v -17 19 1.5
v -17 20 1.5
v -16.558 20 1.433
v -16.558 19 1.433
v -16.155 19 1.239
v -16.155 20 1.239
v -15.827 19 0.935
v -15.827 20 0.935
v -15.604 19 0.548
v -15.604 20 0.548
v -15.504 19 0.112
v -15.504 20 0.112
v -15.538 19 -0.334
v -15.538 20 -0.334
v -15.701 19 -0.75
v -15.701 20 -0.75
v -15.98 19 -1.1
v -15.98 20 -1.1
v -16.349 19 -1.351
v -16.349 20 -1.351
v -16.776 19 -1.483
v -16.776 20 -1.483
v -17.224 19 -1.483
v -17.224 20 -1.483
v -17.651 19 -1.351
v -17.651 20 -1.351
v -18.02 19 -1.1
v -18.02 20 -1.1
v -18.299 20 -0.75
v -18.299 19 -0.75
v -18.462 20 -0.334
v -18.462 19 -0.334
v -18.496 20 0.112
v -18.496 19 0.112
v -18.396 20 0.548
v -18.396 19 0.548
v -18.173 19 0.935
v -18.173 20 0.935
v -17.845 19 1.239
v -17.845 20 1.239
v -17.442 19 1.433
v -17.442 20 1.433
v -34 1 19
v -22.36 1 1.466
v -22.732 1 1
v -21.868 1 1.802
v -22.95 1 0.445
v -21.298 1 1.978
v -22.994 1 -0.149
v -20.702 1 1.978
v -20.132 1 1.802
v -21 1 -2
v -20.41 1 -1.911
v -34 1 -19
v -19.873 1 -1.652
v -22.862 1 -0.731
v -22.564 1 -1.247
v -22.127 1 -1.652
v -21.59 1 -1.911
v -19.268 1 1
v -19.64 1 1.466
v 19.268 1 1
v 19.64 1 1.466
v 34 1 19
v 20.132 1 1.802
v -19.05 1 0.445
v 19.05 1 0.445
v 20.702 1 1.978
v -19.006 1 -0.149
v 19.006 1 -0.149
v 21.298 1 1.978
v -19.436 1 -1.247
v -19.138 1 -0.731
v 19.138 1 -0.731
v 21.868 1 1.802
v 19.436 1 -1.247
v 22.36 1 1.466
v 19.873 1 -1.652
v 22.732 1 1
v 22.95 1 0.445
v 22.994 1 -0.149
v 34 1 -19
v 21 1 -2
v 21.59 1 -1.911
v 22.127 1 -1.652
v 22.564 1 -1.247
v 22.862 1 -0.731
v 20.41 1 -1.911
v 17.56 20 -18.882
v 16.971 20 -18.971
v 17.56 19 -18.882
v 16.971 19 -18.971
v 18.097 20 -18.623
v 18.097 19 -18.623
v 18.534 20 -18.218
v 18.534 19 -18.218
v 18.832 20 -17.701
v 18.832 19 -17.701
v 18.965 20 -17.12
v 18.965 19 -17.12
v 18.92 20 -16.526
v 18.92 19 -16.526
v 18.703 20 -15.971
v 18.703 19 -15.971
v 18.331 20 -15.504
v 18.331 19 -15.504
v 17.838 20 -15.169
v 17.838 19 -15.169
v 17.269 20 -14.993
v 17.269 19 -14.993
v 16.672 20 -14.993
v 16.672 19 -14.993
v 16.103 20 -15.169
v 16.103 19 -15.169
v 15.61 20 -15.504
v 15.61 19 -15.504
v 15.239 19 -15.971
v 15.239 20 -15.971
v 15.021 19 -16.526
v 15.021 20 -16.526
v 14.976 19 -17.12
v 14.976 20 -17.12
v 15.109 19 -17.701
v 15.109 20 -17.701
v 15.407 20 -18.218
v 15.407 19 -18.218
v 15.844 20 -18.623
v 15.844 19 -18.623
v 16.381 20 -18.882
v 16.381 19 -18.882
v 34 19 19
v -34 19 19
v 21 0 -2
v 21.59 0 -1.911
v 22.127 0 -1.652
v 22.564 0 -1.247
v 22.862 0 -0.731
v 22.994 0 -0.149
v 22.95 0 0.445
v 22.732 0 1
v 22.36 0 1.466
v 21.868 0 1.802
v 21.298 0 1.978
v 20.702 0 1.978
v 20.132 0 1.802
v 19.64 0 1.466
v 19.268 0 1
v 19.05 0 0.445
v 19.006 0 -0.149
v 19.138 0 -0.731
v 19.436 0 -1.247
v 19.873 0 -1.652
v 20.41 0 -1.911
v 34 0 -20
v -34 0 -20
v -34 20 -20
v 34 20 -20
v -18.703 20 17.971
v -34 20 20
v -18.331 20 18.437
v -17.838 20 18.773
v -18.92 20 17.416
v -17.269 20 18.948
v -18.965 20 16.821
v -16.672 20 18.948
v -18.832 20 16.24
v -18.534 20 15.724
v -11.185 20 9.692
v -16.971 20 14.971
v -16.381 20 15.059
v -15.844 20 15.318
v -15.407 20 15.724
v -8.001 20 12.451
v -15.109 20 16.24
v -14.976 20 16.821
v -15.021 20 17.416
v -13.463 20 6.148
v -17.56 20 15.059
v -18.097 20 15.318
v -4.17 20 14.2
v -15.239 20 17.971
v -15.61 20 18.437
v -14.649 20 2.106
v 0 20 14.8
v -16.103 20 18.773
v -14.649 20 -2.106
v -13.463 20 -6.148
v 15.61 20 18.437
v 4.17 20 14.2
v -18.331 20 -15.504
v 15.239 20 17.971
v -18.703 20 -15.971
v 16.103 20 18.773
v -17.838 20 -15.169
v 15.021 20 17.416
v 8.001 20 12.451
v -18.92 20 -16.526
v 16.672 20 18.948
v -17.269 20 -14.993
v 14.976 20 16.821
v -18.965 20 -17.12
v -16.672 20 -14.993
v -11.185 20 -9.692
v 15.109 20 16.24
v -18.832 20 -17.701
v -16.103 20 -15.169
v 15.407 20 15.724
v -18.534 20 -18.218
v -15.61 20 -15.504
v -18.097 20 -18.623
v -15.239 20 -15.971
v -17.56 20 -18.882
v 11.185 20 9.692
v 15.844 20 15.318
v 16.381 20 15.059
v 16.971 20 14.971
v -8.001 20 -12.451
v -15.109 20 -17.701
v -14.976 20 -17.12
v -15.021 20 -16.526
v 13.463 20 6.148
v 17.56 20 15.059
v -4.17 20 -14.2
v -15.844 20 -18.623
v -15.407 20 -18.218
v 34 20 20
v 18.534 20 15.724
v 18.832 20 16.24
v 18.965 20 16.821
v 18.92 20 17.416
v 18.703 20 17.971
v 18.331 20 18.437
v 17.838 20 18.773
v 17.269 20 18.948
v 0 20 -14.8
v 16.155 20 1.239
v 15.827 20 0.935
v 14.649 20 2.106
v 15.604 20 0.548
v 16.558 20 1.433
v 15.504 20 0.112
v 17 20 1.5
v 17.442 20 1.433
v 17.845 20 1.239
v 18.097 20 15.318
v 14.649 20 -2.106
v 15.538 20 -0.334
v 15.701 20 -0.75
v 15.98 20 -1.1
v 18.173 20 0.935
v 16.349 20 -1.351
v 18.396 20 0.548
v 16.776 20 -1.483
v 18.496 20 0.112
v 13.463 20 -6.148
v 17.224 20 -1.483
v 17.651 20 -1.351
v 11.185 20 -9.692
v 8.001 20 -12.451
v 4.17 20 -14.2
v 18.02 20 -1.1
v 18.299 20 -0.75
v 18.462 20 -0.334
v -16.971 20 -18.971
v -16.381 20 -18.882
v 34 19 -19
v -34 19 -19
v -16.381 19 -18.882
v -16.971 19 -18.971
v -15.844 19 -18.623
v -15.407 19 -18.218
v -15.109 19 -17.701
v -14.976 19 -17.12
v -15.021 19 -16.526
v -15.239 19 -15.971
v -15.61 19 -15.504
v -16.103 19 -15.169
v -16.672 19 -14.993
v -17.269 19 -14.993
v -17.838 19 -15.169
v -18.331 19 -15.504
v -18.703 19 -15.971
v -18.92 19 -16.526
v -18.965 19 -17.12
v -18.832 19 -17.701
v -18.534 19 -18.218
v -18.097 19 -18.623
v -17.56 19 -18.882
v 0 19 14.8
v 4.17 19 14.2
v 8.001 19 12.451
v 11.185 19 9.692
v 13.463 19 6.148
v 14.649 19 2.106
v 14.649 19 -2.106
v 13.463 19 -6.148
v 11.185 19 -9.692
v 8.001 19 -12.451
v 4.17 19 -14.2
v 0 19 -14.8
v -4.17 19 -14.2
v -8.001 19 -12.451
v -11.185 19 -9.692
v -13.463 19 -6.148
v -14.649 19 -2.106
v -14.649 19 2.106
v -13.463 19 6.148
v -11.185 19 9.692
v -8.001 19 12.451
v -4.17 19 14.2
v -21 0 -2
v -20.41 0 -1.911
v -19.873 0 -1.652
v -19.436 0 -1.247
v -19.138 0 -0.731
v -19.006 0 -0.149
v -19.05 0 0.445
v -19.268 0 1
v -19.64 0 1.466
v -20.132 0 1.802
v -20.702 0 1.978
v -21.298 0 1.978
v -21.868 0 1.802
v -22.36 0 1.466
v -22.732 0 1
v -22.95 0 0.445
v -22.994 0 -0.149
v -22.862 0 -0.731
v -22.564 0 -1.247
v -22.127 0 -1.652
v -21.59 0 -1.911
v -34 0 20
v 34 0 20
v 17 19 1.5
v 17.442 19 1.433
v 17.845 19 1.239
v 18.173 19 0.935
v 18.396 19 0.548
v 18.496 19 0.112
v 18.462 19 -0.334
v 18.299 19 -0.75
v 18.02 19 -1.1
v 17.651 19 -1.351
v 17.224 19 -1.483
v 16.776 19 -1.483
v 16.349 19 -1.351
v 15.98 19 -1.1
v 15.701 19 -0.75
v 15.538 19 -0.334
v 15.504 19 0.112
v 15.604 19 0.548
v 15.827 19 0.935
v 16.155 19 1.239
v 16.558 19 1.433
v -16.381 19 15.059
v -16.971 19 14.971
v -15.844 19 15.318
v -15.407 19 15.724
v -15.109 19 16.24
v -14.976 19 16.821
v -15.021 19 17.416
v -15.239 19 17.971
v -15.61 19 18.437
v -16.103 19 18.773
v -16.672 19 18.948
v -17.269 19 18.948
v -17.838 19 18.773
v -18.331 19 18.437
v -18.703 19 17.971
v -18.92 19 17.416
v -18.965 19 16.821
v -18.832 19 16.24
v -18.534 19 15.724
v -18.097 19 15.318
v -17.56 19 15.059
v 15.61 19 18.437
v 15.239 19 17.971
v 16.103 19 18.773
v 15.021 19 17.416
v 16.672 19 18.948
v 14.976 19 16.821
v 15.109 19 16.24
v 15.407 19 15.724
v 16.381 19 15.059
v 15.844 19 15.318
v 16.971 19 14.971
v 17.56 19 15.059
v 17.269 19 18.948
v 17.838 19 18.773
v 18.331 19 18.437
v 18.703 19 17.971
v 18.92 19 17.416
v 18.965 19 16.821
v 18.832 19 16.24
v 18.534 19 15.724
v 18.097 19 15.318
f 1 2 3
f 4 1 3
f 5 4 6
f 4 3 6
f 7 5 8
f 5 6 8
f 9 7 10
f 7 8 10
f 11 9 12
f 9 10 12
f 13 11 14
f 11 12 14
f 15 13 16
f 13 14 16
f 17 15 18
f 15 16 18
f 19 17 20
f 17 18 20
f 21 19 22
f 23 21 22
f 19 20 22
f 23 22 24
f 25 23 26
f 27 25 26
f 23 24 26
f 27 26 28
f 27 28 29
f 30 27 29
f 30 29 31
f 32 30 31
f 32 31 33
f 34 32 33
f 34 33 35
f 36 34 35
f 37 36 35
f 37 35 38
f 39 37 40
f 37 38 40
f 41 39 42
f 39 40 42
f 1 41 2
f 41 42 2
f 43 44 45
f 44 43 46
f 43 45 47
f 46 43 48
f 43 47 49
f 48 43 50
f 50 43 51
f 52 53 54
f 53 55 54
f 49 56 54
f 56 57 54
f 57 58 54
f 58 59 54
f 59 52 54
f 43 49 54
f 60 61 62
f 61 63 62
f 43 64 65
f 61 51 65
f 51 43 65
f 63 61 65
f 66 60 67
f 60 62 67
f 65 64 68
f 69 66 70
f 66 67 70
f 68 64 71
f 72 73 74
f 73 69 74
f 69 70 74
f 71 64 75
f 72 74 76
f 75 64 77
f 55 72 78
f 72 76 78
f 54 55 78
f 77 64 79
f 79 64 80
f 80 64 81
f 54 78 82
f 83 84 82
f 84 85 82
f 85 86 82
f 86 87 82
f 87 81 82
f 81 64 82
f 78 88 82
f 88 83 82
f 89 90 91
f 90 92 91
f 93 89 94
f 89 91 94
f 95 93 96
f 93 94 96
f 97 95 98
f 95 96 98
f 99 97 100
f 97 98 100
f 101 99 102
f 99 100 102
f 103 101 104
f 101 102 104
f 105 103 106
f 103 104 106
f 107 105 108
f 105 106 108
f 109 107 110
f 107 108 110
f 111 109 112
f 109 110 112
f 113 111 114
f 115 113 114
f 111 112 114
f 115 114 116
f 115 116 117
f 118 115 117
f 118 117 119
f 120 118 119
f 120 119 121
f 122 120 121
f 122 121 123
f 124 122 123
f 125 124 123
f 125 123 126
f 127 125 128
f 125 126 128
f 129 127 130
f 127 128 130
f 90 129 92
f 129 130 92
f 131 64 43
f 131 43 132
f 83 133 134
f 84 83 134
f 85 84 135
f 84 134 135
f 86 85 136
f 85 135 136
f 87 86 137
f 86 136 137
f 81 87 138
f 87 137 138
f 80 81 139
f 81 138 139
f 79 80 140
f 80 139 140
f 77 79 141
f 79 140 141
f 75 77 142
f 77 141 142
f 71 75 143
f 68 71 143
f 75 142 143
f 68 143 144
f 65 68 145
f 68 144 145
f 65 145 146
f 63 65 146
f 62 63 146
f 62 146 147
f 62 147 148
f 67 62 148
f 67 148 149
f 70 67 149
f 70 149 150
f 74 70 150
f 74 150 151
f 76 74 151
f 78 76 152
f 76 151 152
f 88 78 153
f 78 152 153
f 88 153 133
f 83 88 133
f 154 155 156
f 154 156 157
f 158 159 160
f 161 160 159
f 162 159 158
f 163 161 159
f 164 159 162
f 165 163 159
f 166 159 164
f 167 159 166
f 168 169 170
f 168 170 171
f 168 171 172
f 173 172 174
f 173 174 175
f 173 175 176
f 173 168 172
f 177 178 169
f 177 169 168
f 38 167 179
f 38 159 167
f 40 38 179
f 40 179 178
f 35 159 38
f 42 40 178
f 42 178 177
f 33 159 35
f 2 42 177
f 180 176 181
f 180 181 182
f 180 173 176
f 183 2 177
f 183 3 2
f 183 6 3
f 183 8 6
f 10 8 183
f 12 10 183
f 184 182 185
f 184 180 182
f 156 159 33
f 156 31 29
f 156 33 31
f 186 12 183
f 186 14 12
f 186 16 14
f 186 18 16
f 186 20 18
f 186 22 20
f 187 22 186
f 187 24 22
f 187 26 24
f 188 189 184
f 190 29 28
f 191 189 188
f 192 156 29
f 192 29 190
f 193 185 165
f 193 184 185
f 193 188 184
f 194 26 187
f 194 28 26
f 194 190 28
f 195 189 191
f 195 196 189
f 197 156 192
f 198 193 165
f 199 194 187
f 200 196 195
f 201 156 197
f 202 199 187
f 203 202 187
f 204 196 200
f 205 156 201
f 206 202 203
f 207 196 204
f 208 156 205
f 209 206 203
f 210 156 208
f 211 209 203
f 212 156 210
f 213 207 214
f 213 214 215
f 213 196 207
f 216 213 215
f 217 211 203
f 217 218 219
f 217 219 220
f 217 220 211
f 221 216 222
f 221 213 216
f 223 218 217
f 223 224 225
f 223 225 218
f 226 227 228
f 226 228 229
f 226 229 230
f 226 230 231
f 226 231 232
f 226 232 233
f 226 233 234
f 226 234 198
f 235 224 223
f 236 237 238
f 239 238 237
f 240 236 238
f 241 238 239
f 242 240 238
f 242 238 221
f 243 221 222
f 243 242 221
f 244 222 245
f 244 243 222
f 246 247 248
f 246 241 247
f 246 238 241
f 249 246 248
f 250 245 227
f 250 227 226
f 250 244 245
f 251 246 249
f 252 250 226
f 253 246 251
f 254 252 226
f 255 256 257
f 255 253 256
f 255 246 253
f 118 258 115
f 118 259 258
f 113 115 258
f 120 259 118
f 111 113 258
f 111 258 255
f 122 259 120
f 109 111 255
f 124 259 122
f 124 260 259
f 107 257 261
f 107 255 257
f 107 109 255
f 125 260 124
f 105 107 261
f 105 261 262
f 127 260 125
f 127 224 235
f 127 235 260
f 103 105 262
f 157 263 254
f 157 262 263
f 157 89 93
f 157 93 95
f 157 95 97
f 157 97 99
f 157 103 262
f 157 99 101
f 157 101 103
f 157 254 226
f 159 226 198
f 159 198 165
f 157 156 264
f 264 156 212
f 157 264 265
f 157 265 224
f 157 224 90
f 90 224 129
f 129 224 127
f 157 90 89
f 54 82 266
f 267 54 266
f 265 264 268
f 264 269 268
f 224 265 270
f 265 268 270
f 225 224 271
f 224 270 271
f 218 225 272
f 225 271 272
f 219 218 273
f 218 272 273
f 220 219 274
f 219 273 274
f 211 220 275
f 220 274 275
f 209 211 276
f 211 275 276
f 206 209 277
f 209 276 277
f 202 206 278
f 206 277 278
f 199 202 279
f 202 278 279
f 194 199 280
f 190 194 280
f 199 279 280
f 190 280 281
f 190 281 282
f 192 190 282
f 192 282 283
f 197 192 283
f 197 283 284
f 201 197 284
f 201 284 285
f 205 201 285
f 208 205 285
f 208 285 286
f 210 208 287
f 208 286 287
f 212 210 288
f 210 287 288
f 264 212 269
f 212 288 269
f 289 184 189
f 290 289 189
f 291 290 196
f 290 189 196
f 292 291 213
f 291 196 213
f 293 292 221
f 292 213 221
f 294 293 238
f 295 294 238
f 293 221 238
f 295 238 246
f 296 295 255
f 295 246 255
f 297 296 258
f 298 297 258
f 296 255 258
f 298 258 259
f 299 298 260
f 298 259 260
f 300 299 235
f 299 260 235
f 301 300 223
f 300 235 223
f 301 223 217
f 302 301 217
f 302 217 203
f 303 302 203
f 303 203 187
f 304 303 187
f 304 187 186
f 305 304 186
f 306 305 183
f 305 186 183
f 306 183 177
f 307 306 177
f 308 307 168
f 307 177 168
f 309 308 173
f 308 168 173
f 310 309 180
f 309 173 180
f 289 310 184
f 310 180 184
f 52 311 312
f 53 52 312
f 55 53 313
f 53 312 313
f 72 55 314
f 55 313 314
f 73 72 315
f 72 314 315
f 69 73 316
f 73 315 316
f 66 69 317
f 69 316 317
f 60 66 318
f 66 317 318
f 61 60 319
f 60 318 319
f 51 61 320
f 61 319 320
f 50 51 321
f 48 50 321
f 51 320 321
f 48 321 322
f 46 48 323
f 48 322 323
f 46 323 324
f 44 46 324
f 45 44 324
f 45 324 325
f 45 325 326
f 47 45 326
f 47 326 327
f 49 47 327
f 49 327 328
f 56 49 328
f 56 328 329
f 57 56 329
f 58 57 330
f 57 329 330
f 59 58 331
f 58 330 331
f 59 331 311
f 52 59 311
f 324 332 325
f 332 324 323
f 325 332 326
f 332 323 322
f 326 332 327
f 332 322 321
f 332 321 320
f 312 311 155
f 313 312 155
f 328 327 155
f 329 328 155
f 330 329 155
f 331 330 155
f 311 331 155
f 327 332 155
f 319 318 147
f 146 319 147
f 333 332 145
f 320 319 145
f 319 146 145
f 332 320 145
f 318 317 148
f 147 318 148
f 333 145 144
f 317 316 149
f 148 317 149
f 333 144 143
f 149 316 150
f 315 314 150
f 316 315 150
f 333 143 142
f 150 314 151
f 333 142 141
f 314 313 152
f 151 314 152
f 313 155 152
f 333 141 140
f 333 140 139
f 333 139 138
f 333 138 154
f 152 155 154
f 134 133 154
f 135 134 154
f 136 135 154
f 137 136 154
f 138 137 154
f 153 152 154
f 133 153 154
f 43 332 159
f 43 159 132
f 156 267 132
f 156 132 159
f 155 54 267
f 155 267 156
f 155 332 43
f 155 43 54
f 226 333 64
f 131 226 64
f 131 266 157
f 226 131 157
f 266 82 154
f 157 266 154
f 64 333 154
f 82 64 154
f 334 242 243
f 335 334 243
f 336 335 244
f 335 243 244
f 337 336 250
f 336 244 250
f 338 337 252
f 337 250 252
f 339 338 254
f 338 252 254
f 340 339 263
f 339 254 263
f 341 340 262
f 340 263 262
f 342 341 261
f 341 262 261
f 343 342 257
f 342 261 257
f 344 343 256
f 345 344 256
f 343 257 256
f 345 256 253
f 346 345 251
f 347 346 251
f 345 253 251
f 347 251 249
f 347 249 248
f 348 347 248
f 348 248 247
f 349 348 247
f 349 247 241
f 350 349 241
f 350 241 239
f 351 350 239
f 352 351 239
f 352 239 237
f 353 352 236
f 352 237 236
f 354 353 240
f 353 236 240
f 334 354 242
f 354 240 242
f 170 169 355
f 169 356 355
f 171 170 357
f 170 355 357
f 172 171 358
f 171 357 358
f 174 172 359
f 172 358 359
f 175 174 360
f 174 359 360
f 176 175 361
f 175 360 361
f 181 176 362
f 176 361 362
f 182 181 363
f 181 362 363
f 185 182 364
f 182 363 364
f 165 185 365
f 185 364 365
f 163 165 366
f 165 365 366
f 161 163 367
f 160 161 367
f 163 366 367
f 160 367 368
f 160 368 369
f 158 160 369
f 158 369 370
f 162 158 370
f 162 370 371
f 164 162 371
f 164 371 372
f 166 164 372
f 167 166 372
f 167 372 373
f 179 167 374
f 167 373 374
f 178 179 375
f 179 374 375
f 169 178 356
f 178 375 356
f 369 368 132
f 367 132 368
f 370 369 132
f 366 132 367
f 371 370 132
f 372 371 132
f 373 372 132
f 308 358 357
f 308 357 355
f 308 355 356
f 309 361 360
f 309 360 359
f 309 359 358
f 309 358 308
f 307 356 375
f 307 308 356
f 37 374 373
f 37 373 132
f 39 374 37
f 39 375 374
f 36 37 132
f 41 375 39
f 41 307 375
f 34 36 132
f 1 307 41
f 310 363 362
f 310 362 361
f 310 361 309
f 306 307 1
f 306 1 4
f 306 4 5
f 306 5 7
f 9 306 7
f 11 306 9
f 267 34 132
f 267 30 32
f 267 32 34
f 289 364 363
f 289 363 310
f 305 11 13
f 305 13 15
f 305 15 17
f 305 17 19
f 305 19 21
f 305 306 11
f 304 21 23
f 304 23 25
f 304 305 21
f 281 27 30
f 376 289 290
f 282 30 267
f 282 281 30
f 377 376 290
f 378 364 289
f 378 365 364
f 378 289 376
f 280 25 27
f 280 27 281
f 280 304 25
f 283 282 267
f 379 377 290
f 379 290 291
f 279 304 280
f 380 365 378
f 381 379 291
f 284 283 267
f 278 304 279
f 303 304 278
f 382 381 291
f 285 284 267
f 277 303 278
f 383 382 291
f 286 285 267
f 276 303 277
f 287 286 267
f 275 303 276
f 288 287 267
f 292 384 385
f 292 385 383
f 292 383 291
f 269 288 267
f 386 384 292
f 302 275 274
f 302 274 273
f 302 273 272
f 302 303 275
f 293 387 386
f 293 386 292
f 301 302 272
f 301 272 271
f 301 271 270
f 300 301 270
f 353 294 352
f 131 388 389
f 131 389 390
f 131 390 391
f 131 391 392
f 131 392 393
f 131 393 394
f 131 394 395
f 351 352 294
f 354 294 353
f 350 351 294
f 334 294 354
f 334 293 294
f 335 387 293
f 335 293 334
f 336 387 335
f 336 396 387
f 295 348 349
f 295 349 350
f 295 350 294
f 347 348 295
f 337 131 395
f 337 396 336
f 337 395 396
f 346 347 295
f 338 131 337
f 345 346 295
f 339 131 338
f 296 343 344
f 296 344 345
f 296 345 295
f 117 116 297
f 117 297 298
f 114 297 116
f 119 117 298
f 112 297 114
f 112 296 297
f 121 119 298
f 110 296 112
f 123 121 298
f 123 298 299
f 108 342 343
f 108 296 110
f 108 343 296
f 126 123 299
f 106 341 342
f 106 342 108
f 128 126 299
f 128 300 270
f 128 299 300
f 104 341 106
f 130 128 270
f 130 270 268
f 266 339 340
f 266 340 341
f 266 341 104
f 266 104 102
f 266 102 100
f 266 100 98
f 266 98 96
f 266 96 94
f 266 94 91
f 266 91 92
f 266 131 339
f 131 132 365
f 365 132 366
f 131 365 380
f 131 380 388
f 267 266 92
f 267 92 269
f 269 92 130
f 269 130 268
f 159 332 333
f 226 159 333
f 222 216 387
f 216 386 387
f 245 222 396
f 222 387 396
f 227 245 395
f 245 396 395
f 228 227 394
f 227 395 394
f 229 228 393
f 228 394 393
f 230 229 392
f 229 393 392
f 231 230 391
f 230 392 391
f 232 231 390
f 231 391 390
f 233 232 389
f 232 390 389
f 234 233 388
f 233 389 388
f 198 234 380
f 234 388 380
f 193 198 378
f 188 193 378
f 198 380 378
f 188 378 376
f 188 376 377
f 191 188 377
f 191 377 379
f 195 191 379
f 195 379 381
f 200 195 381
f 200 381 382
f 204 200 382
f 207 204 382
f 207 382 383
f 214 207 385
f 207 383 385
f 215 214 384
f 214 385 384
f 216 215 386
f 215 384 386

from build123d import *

# Parameters (mm, degrees)
SKETCH_1_W          = 68
SKETCH_1_H          = 40
EXTRUDE_1_DEPTH     = 20
SKETCH_2_W          = 38
SKETCH_2_H          = 18
CUT_EXTRUDE_1_DEPTH = 74.647810558
SKETCH_3_R          = 2
CUT_EXTRUDE_2_DEPTH = 1
SKETCH_4_R          = 14.8
SKETCH_4_R_2        = 1.5
CUT_EXTRUDE_3_DEPTH = 1
MM_PRESS_1_D        = 4
MM_PRESS_1_DEPTH    = 1
MM_PRESS_1_TIP      = 1.201721238


with BuildPart() as part:
    # 草图1 → 凸台-拉伸1 (new body)
    with BuildSketch(Plane(origin=(0, 0, 0), x_dir=(1, 0, 0), z_dir=(0, 1, 0))):
        Rectangle(SKETCH_1_W, SKETCH_1_H)
    extrude(amount=EXTRUDE_1_DEPTH)

    # 草图2 → 切除-拉伸1 (cut, through all)
    with BuildSketch(Plane(origin=(34, 0, 0), x_dir=(0, 0, -1), z_dir=(1, 0, 0))):
        with Locations((0, 10)):
            Rectangle(SKETCH_2_W, SKETCH_2_H)
    extrude(amount=-CUT_EXTRUDE_1_DEPTH, mode=Mode.SUBTRACT)

    # 草图3 → 切除-拉伸2 (cut)
    with BuildSketch(Plane.XZ):
        with Locations(Location((-21, 0, 0), (0, 0, 270))):
            Circle(SKETCH_3_R)
        with Locations(Location((21, 0, 0), (0, 0, 270))):
            Circle(SKETCH_3_R)
    extrude(amount=-CUT_EXTRUDE_2_DEPTH, mode=Mode.SUBTRACT)

    # 草图4 → 切除-拉伸3 (cut)
    with BuildSketch(Plane(origin=(0, 20, 0), x_dir=(1, 0, 0), z_dir=(0, 1, 0))):
        with Locations(Location((0, 0, 0), (0, 0, 270))):
            Circle(SKETCH_4_R)
        with Locations(Location((-17, 0, 0), (0, 0, 270))):
            Circle(SKETCH_4_R_2)
        with Locations(Location((17, 0, 0), (0, 0, 270))):
            Circle(SKETCH_4_R_2)
    extrude(amount=-CUT_EXTRUDE_3_DEPTH, mode=Mode.SUBTRACT)

    # 大小mm Press 暗销孔1
    with Locations(Plane(origin=(16.970562748, 20, 16.970562748), x_dir=(0, 0, 1), z_dir=(0, 1, 0))):
        with Locations((0, 0), (0, -33.941125496), (-33.941125496, -33.941125496), (-33.941125496, 0)):
            Hole(MM_PRESS_1_D / 2, depth=MM_PRESS_1_DEPTH)
            with Locations((0, 0, -(MM_PRESS_1_DEPTH + MM_PRESS_1_TIP / 2))):  # 118° drill point
                Cone(0, MM_PRESS_1_D / 2, MM_PRESS_1_TIP, mode=Mode.SUBTRACT)


solid = part.part
